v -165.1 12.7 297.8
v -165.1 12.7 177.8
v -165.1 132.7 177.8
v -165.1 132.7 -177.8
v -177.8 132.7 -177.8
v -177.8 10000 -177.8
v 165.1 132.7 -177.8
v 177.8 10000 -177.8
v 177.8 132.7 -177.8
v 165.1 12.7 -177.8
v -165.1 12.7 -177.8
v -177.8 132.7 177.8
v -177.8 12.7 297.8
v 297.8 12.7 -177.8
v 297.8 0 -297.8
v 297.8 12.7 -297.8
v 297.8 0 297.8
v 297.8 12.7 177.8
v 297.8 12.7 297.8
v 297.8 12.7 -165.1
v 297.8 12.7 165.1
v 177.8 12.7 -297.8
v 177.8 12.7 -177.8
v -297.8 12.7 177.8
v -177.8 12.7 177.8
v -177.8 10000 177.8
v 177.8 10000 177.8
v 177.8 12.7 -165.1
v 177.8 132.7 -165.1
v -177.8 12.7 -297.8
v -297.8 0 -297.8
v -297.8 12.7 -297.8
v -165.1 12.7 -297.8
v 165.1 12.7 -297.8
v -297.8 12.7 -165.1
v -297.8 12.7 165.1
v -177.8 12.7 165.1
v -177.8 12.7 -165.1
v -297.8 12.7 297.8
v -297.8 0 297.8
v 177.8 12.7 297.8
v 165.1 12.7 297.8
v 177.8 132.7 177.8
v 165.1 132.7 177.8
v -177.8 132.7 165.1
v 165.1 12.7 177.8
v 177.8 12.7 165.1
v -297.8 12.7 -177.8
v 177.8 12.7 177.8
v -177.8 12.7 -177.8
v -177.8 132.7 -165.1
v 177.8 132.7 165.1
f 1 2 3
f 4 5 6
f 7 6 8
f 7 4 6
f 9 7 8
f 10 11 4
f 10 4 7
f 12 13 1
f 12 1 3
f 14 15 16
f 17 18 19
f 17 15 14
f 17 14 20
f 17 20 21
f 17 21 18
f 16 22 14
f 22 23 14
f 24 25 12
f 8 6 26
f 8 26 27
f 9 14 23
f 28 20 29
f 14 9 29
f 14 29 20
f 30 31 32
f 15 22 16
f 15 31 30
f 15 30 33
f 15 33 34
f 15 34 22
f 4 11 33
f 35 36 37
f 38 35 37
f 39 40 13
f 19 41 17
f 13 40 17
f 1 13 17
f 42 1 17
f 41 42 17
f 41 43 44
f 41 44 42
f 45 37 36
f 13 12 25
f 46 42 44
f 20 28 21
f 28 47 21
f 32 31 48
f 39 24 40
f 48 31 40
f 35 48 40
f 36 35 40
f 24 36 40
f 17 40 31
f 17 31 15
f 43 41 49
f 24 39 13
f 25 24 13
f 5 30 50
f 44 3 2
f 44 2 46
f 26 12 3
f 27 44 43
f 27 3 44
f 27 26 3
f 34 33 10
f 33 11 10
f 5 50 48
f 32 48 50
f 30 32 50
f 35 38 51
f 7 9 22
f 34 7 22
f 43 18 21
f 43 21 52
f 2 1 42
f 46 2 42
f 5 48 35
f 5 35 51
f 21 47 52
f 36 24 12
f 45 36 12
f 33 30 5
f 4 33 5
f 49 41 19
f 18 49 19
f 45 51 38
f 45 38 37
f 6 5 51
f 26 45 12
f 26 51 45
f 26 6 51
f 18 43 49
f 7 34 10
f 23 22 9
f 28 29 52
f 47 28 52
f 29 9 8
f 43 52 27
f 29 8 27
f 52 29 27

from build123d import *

# Parameters (mm, degrees)
CROQUIS1_W               = 355.6
CROQUIS1_H               = 355.6
SALIENTE_EXTRUIR1_DEPTH  = 10000
CROQUIS2_W               = 595.6
CROQUIS2_H               = 595.6
SALIENTE_EXTRUIR2_DEPTH  = 12.7
SALIENTE_EXTRUIR3_DEPTH  = 12.7
SALIENTE_EXTRUIR4_DEPTH  = 12.7
SALIENTE_EXTRUIR5_DEPTH  = 12.7
SALIENTE_EXTRUIR6_DEPTH  = 12.7
SALIENTE_EXTRUIR7_DEPTH  = 12.7
SALIENTE_EXTRUIR8_DEPTH  = 12.7
SALIENTE_EXTRUIR9_DEPTH  = 12.7
SALIENTE_EXTRUIR10_DEPTH = 12.7


with BuildPart() as part:
    # Croquis1 → Saliente-Extruir1 (new body)
    with BuildSketch(Plane(origin=(0, 0, 0), x_dir=(1, 0, 0), z_dir=(0, 1, 0))):
        Rectangle(CROQUIS1_W, CROQUIS1_H)
    extrude(amount=SALIENTE_EXTRUIR1_DEPTH)

    # Croquis2 → Saliente-Extruir2 (add)
    with BuildSketch(Plane.XZ):
        Rectangle(CROQUIS2_W, CROQUIS2_H)
    extrude(amount=-SALIENTE_EXTRUIR2_DEPTH)

    # Croquis3 → Saliente-Extruir3 (add)
    with BuildSketch(Plane.ZY.offset(177.8)):
        Polygon((-297.8, 12.7), (-177.8, 132.7), (-177.8, 12.7), align=None)
    extrude(amount=-SALIENTE_EXTRUIR3_DEPTH)

    # Croquis4 → Saliente-Extruir4 (add)
    with BuildSketch(Plane(origin=(177.8, 0, 0), x_dir=(0, 0, -1), z_dir=(1, 0, 0))):
        Polygon((177.8, 132.7), (297.8, 12.7), (177.8, 12.7), align=None)
    extrude(amount=-SALIENTE_EXTRUIR4_DEPTH)

    # Croquis5 → Saliente-Extruir5 (add)
    with BuildSketch(Plane.XY.offset(177.8)):
        Polygon((297.8, 12.7), (177.8, 132.7), (177.8, 12.7), align=None)
    extrude(amount=-SALIENTE_EXTRUIR5_DEPTH)

    # Croquis6 → Saliente-Extruir6 (add)
    with BuildSketch(Plane(origin=(0, 0, -177.8), x_dir=(-1, 0, 0), z_dir=(0, 0, -1))):
        Polygon((-177.8, 132.7), (-297.8, 12.7), (-177.8, 12.7), align=None)
    extrude(amount=-SALIENTE_EXTRUIR6_DEPTH)

    # Croquis7 → Saliente-Extruir7 (add)
    with BuildSketch(Plane.ZY.offset(177.8)):
        Polygon((297.8, 12.7), (177.8, 132.7), (177.8, 12.7), align=None)
    extrude(amount=-SALIENTE_EXTRUIR7_DEPTH)

    # Croquis8 → Saliente-Extruir8 (add)
    with BuildSketch(Plane(origin=(177.8, 0, 0), x_dir=(0, 0, -1), z_dir=(1, 0, 0))):
        Polygon((-177.8, 132.7), (-297.8, 12.7), (-177.8, 12.7), align=None)
    extrude(amount=-SALIENTE_EXTRUIR8_DEPTH)

    # Croquis9 → Saliente-Extruir9 (add)
    with BuildSketch(Plane(origin=(0, 0, -177.8), x_dir=(-1, 0, 0), z_dir=(0, 0, -1))):
        Polygon((297.8, 12.7), (177.8, 132.7), (177.8, 12.7), align=None)
    extrude(amount=-SALIENTE_EXTRUIR9_DEPTH)

    # Croquis10 → Saliente-Extruir10 (add)
    with BuildSketch(Plane.XY.offset(177.8)):
        Polygon((-297.8, 12.7), (-177.8, 132.7), (-177.8, 12.7), align=None)
    extrude(amount=-SALIENTE_EXTRUIR10_DEPTH)


solid = part.part
